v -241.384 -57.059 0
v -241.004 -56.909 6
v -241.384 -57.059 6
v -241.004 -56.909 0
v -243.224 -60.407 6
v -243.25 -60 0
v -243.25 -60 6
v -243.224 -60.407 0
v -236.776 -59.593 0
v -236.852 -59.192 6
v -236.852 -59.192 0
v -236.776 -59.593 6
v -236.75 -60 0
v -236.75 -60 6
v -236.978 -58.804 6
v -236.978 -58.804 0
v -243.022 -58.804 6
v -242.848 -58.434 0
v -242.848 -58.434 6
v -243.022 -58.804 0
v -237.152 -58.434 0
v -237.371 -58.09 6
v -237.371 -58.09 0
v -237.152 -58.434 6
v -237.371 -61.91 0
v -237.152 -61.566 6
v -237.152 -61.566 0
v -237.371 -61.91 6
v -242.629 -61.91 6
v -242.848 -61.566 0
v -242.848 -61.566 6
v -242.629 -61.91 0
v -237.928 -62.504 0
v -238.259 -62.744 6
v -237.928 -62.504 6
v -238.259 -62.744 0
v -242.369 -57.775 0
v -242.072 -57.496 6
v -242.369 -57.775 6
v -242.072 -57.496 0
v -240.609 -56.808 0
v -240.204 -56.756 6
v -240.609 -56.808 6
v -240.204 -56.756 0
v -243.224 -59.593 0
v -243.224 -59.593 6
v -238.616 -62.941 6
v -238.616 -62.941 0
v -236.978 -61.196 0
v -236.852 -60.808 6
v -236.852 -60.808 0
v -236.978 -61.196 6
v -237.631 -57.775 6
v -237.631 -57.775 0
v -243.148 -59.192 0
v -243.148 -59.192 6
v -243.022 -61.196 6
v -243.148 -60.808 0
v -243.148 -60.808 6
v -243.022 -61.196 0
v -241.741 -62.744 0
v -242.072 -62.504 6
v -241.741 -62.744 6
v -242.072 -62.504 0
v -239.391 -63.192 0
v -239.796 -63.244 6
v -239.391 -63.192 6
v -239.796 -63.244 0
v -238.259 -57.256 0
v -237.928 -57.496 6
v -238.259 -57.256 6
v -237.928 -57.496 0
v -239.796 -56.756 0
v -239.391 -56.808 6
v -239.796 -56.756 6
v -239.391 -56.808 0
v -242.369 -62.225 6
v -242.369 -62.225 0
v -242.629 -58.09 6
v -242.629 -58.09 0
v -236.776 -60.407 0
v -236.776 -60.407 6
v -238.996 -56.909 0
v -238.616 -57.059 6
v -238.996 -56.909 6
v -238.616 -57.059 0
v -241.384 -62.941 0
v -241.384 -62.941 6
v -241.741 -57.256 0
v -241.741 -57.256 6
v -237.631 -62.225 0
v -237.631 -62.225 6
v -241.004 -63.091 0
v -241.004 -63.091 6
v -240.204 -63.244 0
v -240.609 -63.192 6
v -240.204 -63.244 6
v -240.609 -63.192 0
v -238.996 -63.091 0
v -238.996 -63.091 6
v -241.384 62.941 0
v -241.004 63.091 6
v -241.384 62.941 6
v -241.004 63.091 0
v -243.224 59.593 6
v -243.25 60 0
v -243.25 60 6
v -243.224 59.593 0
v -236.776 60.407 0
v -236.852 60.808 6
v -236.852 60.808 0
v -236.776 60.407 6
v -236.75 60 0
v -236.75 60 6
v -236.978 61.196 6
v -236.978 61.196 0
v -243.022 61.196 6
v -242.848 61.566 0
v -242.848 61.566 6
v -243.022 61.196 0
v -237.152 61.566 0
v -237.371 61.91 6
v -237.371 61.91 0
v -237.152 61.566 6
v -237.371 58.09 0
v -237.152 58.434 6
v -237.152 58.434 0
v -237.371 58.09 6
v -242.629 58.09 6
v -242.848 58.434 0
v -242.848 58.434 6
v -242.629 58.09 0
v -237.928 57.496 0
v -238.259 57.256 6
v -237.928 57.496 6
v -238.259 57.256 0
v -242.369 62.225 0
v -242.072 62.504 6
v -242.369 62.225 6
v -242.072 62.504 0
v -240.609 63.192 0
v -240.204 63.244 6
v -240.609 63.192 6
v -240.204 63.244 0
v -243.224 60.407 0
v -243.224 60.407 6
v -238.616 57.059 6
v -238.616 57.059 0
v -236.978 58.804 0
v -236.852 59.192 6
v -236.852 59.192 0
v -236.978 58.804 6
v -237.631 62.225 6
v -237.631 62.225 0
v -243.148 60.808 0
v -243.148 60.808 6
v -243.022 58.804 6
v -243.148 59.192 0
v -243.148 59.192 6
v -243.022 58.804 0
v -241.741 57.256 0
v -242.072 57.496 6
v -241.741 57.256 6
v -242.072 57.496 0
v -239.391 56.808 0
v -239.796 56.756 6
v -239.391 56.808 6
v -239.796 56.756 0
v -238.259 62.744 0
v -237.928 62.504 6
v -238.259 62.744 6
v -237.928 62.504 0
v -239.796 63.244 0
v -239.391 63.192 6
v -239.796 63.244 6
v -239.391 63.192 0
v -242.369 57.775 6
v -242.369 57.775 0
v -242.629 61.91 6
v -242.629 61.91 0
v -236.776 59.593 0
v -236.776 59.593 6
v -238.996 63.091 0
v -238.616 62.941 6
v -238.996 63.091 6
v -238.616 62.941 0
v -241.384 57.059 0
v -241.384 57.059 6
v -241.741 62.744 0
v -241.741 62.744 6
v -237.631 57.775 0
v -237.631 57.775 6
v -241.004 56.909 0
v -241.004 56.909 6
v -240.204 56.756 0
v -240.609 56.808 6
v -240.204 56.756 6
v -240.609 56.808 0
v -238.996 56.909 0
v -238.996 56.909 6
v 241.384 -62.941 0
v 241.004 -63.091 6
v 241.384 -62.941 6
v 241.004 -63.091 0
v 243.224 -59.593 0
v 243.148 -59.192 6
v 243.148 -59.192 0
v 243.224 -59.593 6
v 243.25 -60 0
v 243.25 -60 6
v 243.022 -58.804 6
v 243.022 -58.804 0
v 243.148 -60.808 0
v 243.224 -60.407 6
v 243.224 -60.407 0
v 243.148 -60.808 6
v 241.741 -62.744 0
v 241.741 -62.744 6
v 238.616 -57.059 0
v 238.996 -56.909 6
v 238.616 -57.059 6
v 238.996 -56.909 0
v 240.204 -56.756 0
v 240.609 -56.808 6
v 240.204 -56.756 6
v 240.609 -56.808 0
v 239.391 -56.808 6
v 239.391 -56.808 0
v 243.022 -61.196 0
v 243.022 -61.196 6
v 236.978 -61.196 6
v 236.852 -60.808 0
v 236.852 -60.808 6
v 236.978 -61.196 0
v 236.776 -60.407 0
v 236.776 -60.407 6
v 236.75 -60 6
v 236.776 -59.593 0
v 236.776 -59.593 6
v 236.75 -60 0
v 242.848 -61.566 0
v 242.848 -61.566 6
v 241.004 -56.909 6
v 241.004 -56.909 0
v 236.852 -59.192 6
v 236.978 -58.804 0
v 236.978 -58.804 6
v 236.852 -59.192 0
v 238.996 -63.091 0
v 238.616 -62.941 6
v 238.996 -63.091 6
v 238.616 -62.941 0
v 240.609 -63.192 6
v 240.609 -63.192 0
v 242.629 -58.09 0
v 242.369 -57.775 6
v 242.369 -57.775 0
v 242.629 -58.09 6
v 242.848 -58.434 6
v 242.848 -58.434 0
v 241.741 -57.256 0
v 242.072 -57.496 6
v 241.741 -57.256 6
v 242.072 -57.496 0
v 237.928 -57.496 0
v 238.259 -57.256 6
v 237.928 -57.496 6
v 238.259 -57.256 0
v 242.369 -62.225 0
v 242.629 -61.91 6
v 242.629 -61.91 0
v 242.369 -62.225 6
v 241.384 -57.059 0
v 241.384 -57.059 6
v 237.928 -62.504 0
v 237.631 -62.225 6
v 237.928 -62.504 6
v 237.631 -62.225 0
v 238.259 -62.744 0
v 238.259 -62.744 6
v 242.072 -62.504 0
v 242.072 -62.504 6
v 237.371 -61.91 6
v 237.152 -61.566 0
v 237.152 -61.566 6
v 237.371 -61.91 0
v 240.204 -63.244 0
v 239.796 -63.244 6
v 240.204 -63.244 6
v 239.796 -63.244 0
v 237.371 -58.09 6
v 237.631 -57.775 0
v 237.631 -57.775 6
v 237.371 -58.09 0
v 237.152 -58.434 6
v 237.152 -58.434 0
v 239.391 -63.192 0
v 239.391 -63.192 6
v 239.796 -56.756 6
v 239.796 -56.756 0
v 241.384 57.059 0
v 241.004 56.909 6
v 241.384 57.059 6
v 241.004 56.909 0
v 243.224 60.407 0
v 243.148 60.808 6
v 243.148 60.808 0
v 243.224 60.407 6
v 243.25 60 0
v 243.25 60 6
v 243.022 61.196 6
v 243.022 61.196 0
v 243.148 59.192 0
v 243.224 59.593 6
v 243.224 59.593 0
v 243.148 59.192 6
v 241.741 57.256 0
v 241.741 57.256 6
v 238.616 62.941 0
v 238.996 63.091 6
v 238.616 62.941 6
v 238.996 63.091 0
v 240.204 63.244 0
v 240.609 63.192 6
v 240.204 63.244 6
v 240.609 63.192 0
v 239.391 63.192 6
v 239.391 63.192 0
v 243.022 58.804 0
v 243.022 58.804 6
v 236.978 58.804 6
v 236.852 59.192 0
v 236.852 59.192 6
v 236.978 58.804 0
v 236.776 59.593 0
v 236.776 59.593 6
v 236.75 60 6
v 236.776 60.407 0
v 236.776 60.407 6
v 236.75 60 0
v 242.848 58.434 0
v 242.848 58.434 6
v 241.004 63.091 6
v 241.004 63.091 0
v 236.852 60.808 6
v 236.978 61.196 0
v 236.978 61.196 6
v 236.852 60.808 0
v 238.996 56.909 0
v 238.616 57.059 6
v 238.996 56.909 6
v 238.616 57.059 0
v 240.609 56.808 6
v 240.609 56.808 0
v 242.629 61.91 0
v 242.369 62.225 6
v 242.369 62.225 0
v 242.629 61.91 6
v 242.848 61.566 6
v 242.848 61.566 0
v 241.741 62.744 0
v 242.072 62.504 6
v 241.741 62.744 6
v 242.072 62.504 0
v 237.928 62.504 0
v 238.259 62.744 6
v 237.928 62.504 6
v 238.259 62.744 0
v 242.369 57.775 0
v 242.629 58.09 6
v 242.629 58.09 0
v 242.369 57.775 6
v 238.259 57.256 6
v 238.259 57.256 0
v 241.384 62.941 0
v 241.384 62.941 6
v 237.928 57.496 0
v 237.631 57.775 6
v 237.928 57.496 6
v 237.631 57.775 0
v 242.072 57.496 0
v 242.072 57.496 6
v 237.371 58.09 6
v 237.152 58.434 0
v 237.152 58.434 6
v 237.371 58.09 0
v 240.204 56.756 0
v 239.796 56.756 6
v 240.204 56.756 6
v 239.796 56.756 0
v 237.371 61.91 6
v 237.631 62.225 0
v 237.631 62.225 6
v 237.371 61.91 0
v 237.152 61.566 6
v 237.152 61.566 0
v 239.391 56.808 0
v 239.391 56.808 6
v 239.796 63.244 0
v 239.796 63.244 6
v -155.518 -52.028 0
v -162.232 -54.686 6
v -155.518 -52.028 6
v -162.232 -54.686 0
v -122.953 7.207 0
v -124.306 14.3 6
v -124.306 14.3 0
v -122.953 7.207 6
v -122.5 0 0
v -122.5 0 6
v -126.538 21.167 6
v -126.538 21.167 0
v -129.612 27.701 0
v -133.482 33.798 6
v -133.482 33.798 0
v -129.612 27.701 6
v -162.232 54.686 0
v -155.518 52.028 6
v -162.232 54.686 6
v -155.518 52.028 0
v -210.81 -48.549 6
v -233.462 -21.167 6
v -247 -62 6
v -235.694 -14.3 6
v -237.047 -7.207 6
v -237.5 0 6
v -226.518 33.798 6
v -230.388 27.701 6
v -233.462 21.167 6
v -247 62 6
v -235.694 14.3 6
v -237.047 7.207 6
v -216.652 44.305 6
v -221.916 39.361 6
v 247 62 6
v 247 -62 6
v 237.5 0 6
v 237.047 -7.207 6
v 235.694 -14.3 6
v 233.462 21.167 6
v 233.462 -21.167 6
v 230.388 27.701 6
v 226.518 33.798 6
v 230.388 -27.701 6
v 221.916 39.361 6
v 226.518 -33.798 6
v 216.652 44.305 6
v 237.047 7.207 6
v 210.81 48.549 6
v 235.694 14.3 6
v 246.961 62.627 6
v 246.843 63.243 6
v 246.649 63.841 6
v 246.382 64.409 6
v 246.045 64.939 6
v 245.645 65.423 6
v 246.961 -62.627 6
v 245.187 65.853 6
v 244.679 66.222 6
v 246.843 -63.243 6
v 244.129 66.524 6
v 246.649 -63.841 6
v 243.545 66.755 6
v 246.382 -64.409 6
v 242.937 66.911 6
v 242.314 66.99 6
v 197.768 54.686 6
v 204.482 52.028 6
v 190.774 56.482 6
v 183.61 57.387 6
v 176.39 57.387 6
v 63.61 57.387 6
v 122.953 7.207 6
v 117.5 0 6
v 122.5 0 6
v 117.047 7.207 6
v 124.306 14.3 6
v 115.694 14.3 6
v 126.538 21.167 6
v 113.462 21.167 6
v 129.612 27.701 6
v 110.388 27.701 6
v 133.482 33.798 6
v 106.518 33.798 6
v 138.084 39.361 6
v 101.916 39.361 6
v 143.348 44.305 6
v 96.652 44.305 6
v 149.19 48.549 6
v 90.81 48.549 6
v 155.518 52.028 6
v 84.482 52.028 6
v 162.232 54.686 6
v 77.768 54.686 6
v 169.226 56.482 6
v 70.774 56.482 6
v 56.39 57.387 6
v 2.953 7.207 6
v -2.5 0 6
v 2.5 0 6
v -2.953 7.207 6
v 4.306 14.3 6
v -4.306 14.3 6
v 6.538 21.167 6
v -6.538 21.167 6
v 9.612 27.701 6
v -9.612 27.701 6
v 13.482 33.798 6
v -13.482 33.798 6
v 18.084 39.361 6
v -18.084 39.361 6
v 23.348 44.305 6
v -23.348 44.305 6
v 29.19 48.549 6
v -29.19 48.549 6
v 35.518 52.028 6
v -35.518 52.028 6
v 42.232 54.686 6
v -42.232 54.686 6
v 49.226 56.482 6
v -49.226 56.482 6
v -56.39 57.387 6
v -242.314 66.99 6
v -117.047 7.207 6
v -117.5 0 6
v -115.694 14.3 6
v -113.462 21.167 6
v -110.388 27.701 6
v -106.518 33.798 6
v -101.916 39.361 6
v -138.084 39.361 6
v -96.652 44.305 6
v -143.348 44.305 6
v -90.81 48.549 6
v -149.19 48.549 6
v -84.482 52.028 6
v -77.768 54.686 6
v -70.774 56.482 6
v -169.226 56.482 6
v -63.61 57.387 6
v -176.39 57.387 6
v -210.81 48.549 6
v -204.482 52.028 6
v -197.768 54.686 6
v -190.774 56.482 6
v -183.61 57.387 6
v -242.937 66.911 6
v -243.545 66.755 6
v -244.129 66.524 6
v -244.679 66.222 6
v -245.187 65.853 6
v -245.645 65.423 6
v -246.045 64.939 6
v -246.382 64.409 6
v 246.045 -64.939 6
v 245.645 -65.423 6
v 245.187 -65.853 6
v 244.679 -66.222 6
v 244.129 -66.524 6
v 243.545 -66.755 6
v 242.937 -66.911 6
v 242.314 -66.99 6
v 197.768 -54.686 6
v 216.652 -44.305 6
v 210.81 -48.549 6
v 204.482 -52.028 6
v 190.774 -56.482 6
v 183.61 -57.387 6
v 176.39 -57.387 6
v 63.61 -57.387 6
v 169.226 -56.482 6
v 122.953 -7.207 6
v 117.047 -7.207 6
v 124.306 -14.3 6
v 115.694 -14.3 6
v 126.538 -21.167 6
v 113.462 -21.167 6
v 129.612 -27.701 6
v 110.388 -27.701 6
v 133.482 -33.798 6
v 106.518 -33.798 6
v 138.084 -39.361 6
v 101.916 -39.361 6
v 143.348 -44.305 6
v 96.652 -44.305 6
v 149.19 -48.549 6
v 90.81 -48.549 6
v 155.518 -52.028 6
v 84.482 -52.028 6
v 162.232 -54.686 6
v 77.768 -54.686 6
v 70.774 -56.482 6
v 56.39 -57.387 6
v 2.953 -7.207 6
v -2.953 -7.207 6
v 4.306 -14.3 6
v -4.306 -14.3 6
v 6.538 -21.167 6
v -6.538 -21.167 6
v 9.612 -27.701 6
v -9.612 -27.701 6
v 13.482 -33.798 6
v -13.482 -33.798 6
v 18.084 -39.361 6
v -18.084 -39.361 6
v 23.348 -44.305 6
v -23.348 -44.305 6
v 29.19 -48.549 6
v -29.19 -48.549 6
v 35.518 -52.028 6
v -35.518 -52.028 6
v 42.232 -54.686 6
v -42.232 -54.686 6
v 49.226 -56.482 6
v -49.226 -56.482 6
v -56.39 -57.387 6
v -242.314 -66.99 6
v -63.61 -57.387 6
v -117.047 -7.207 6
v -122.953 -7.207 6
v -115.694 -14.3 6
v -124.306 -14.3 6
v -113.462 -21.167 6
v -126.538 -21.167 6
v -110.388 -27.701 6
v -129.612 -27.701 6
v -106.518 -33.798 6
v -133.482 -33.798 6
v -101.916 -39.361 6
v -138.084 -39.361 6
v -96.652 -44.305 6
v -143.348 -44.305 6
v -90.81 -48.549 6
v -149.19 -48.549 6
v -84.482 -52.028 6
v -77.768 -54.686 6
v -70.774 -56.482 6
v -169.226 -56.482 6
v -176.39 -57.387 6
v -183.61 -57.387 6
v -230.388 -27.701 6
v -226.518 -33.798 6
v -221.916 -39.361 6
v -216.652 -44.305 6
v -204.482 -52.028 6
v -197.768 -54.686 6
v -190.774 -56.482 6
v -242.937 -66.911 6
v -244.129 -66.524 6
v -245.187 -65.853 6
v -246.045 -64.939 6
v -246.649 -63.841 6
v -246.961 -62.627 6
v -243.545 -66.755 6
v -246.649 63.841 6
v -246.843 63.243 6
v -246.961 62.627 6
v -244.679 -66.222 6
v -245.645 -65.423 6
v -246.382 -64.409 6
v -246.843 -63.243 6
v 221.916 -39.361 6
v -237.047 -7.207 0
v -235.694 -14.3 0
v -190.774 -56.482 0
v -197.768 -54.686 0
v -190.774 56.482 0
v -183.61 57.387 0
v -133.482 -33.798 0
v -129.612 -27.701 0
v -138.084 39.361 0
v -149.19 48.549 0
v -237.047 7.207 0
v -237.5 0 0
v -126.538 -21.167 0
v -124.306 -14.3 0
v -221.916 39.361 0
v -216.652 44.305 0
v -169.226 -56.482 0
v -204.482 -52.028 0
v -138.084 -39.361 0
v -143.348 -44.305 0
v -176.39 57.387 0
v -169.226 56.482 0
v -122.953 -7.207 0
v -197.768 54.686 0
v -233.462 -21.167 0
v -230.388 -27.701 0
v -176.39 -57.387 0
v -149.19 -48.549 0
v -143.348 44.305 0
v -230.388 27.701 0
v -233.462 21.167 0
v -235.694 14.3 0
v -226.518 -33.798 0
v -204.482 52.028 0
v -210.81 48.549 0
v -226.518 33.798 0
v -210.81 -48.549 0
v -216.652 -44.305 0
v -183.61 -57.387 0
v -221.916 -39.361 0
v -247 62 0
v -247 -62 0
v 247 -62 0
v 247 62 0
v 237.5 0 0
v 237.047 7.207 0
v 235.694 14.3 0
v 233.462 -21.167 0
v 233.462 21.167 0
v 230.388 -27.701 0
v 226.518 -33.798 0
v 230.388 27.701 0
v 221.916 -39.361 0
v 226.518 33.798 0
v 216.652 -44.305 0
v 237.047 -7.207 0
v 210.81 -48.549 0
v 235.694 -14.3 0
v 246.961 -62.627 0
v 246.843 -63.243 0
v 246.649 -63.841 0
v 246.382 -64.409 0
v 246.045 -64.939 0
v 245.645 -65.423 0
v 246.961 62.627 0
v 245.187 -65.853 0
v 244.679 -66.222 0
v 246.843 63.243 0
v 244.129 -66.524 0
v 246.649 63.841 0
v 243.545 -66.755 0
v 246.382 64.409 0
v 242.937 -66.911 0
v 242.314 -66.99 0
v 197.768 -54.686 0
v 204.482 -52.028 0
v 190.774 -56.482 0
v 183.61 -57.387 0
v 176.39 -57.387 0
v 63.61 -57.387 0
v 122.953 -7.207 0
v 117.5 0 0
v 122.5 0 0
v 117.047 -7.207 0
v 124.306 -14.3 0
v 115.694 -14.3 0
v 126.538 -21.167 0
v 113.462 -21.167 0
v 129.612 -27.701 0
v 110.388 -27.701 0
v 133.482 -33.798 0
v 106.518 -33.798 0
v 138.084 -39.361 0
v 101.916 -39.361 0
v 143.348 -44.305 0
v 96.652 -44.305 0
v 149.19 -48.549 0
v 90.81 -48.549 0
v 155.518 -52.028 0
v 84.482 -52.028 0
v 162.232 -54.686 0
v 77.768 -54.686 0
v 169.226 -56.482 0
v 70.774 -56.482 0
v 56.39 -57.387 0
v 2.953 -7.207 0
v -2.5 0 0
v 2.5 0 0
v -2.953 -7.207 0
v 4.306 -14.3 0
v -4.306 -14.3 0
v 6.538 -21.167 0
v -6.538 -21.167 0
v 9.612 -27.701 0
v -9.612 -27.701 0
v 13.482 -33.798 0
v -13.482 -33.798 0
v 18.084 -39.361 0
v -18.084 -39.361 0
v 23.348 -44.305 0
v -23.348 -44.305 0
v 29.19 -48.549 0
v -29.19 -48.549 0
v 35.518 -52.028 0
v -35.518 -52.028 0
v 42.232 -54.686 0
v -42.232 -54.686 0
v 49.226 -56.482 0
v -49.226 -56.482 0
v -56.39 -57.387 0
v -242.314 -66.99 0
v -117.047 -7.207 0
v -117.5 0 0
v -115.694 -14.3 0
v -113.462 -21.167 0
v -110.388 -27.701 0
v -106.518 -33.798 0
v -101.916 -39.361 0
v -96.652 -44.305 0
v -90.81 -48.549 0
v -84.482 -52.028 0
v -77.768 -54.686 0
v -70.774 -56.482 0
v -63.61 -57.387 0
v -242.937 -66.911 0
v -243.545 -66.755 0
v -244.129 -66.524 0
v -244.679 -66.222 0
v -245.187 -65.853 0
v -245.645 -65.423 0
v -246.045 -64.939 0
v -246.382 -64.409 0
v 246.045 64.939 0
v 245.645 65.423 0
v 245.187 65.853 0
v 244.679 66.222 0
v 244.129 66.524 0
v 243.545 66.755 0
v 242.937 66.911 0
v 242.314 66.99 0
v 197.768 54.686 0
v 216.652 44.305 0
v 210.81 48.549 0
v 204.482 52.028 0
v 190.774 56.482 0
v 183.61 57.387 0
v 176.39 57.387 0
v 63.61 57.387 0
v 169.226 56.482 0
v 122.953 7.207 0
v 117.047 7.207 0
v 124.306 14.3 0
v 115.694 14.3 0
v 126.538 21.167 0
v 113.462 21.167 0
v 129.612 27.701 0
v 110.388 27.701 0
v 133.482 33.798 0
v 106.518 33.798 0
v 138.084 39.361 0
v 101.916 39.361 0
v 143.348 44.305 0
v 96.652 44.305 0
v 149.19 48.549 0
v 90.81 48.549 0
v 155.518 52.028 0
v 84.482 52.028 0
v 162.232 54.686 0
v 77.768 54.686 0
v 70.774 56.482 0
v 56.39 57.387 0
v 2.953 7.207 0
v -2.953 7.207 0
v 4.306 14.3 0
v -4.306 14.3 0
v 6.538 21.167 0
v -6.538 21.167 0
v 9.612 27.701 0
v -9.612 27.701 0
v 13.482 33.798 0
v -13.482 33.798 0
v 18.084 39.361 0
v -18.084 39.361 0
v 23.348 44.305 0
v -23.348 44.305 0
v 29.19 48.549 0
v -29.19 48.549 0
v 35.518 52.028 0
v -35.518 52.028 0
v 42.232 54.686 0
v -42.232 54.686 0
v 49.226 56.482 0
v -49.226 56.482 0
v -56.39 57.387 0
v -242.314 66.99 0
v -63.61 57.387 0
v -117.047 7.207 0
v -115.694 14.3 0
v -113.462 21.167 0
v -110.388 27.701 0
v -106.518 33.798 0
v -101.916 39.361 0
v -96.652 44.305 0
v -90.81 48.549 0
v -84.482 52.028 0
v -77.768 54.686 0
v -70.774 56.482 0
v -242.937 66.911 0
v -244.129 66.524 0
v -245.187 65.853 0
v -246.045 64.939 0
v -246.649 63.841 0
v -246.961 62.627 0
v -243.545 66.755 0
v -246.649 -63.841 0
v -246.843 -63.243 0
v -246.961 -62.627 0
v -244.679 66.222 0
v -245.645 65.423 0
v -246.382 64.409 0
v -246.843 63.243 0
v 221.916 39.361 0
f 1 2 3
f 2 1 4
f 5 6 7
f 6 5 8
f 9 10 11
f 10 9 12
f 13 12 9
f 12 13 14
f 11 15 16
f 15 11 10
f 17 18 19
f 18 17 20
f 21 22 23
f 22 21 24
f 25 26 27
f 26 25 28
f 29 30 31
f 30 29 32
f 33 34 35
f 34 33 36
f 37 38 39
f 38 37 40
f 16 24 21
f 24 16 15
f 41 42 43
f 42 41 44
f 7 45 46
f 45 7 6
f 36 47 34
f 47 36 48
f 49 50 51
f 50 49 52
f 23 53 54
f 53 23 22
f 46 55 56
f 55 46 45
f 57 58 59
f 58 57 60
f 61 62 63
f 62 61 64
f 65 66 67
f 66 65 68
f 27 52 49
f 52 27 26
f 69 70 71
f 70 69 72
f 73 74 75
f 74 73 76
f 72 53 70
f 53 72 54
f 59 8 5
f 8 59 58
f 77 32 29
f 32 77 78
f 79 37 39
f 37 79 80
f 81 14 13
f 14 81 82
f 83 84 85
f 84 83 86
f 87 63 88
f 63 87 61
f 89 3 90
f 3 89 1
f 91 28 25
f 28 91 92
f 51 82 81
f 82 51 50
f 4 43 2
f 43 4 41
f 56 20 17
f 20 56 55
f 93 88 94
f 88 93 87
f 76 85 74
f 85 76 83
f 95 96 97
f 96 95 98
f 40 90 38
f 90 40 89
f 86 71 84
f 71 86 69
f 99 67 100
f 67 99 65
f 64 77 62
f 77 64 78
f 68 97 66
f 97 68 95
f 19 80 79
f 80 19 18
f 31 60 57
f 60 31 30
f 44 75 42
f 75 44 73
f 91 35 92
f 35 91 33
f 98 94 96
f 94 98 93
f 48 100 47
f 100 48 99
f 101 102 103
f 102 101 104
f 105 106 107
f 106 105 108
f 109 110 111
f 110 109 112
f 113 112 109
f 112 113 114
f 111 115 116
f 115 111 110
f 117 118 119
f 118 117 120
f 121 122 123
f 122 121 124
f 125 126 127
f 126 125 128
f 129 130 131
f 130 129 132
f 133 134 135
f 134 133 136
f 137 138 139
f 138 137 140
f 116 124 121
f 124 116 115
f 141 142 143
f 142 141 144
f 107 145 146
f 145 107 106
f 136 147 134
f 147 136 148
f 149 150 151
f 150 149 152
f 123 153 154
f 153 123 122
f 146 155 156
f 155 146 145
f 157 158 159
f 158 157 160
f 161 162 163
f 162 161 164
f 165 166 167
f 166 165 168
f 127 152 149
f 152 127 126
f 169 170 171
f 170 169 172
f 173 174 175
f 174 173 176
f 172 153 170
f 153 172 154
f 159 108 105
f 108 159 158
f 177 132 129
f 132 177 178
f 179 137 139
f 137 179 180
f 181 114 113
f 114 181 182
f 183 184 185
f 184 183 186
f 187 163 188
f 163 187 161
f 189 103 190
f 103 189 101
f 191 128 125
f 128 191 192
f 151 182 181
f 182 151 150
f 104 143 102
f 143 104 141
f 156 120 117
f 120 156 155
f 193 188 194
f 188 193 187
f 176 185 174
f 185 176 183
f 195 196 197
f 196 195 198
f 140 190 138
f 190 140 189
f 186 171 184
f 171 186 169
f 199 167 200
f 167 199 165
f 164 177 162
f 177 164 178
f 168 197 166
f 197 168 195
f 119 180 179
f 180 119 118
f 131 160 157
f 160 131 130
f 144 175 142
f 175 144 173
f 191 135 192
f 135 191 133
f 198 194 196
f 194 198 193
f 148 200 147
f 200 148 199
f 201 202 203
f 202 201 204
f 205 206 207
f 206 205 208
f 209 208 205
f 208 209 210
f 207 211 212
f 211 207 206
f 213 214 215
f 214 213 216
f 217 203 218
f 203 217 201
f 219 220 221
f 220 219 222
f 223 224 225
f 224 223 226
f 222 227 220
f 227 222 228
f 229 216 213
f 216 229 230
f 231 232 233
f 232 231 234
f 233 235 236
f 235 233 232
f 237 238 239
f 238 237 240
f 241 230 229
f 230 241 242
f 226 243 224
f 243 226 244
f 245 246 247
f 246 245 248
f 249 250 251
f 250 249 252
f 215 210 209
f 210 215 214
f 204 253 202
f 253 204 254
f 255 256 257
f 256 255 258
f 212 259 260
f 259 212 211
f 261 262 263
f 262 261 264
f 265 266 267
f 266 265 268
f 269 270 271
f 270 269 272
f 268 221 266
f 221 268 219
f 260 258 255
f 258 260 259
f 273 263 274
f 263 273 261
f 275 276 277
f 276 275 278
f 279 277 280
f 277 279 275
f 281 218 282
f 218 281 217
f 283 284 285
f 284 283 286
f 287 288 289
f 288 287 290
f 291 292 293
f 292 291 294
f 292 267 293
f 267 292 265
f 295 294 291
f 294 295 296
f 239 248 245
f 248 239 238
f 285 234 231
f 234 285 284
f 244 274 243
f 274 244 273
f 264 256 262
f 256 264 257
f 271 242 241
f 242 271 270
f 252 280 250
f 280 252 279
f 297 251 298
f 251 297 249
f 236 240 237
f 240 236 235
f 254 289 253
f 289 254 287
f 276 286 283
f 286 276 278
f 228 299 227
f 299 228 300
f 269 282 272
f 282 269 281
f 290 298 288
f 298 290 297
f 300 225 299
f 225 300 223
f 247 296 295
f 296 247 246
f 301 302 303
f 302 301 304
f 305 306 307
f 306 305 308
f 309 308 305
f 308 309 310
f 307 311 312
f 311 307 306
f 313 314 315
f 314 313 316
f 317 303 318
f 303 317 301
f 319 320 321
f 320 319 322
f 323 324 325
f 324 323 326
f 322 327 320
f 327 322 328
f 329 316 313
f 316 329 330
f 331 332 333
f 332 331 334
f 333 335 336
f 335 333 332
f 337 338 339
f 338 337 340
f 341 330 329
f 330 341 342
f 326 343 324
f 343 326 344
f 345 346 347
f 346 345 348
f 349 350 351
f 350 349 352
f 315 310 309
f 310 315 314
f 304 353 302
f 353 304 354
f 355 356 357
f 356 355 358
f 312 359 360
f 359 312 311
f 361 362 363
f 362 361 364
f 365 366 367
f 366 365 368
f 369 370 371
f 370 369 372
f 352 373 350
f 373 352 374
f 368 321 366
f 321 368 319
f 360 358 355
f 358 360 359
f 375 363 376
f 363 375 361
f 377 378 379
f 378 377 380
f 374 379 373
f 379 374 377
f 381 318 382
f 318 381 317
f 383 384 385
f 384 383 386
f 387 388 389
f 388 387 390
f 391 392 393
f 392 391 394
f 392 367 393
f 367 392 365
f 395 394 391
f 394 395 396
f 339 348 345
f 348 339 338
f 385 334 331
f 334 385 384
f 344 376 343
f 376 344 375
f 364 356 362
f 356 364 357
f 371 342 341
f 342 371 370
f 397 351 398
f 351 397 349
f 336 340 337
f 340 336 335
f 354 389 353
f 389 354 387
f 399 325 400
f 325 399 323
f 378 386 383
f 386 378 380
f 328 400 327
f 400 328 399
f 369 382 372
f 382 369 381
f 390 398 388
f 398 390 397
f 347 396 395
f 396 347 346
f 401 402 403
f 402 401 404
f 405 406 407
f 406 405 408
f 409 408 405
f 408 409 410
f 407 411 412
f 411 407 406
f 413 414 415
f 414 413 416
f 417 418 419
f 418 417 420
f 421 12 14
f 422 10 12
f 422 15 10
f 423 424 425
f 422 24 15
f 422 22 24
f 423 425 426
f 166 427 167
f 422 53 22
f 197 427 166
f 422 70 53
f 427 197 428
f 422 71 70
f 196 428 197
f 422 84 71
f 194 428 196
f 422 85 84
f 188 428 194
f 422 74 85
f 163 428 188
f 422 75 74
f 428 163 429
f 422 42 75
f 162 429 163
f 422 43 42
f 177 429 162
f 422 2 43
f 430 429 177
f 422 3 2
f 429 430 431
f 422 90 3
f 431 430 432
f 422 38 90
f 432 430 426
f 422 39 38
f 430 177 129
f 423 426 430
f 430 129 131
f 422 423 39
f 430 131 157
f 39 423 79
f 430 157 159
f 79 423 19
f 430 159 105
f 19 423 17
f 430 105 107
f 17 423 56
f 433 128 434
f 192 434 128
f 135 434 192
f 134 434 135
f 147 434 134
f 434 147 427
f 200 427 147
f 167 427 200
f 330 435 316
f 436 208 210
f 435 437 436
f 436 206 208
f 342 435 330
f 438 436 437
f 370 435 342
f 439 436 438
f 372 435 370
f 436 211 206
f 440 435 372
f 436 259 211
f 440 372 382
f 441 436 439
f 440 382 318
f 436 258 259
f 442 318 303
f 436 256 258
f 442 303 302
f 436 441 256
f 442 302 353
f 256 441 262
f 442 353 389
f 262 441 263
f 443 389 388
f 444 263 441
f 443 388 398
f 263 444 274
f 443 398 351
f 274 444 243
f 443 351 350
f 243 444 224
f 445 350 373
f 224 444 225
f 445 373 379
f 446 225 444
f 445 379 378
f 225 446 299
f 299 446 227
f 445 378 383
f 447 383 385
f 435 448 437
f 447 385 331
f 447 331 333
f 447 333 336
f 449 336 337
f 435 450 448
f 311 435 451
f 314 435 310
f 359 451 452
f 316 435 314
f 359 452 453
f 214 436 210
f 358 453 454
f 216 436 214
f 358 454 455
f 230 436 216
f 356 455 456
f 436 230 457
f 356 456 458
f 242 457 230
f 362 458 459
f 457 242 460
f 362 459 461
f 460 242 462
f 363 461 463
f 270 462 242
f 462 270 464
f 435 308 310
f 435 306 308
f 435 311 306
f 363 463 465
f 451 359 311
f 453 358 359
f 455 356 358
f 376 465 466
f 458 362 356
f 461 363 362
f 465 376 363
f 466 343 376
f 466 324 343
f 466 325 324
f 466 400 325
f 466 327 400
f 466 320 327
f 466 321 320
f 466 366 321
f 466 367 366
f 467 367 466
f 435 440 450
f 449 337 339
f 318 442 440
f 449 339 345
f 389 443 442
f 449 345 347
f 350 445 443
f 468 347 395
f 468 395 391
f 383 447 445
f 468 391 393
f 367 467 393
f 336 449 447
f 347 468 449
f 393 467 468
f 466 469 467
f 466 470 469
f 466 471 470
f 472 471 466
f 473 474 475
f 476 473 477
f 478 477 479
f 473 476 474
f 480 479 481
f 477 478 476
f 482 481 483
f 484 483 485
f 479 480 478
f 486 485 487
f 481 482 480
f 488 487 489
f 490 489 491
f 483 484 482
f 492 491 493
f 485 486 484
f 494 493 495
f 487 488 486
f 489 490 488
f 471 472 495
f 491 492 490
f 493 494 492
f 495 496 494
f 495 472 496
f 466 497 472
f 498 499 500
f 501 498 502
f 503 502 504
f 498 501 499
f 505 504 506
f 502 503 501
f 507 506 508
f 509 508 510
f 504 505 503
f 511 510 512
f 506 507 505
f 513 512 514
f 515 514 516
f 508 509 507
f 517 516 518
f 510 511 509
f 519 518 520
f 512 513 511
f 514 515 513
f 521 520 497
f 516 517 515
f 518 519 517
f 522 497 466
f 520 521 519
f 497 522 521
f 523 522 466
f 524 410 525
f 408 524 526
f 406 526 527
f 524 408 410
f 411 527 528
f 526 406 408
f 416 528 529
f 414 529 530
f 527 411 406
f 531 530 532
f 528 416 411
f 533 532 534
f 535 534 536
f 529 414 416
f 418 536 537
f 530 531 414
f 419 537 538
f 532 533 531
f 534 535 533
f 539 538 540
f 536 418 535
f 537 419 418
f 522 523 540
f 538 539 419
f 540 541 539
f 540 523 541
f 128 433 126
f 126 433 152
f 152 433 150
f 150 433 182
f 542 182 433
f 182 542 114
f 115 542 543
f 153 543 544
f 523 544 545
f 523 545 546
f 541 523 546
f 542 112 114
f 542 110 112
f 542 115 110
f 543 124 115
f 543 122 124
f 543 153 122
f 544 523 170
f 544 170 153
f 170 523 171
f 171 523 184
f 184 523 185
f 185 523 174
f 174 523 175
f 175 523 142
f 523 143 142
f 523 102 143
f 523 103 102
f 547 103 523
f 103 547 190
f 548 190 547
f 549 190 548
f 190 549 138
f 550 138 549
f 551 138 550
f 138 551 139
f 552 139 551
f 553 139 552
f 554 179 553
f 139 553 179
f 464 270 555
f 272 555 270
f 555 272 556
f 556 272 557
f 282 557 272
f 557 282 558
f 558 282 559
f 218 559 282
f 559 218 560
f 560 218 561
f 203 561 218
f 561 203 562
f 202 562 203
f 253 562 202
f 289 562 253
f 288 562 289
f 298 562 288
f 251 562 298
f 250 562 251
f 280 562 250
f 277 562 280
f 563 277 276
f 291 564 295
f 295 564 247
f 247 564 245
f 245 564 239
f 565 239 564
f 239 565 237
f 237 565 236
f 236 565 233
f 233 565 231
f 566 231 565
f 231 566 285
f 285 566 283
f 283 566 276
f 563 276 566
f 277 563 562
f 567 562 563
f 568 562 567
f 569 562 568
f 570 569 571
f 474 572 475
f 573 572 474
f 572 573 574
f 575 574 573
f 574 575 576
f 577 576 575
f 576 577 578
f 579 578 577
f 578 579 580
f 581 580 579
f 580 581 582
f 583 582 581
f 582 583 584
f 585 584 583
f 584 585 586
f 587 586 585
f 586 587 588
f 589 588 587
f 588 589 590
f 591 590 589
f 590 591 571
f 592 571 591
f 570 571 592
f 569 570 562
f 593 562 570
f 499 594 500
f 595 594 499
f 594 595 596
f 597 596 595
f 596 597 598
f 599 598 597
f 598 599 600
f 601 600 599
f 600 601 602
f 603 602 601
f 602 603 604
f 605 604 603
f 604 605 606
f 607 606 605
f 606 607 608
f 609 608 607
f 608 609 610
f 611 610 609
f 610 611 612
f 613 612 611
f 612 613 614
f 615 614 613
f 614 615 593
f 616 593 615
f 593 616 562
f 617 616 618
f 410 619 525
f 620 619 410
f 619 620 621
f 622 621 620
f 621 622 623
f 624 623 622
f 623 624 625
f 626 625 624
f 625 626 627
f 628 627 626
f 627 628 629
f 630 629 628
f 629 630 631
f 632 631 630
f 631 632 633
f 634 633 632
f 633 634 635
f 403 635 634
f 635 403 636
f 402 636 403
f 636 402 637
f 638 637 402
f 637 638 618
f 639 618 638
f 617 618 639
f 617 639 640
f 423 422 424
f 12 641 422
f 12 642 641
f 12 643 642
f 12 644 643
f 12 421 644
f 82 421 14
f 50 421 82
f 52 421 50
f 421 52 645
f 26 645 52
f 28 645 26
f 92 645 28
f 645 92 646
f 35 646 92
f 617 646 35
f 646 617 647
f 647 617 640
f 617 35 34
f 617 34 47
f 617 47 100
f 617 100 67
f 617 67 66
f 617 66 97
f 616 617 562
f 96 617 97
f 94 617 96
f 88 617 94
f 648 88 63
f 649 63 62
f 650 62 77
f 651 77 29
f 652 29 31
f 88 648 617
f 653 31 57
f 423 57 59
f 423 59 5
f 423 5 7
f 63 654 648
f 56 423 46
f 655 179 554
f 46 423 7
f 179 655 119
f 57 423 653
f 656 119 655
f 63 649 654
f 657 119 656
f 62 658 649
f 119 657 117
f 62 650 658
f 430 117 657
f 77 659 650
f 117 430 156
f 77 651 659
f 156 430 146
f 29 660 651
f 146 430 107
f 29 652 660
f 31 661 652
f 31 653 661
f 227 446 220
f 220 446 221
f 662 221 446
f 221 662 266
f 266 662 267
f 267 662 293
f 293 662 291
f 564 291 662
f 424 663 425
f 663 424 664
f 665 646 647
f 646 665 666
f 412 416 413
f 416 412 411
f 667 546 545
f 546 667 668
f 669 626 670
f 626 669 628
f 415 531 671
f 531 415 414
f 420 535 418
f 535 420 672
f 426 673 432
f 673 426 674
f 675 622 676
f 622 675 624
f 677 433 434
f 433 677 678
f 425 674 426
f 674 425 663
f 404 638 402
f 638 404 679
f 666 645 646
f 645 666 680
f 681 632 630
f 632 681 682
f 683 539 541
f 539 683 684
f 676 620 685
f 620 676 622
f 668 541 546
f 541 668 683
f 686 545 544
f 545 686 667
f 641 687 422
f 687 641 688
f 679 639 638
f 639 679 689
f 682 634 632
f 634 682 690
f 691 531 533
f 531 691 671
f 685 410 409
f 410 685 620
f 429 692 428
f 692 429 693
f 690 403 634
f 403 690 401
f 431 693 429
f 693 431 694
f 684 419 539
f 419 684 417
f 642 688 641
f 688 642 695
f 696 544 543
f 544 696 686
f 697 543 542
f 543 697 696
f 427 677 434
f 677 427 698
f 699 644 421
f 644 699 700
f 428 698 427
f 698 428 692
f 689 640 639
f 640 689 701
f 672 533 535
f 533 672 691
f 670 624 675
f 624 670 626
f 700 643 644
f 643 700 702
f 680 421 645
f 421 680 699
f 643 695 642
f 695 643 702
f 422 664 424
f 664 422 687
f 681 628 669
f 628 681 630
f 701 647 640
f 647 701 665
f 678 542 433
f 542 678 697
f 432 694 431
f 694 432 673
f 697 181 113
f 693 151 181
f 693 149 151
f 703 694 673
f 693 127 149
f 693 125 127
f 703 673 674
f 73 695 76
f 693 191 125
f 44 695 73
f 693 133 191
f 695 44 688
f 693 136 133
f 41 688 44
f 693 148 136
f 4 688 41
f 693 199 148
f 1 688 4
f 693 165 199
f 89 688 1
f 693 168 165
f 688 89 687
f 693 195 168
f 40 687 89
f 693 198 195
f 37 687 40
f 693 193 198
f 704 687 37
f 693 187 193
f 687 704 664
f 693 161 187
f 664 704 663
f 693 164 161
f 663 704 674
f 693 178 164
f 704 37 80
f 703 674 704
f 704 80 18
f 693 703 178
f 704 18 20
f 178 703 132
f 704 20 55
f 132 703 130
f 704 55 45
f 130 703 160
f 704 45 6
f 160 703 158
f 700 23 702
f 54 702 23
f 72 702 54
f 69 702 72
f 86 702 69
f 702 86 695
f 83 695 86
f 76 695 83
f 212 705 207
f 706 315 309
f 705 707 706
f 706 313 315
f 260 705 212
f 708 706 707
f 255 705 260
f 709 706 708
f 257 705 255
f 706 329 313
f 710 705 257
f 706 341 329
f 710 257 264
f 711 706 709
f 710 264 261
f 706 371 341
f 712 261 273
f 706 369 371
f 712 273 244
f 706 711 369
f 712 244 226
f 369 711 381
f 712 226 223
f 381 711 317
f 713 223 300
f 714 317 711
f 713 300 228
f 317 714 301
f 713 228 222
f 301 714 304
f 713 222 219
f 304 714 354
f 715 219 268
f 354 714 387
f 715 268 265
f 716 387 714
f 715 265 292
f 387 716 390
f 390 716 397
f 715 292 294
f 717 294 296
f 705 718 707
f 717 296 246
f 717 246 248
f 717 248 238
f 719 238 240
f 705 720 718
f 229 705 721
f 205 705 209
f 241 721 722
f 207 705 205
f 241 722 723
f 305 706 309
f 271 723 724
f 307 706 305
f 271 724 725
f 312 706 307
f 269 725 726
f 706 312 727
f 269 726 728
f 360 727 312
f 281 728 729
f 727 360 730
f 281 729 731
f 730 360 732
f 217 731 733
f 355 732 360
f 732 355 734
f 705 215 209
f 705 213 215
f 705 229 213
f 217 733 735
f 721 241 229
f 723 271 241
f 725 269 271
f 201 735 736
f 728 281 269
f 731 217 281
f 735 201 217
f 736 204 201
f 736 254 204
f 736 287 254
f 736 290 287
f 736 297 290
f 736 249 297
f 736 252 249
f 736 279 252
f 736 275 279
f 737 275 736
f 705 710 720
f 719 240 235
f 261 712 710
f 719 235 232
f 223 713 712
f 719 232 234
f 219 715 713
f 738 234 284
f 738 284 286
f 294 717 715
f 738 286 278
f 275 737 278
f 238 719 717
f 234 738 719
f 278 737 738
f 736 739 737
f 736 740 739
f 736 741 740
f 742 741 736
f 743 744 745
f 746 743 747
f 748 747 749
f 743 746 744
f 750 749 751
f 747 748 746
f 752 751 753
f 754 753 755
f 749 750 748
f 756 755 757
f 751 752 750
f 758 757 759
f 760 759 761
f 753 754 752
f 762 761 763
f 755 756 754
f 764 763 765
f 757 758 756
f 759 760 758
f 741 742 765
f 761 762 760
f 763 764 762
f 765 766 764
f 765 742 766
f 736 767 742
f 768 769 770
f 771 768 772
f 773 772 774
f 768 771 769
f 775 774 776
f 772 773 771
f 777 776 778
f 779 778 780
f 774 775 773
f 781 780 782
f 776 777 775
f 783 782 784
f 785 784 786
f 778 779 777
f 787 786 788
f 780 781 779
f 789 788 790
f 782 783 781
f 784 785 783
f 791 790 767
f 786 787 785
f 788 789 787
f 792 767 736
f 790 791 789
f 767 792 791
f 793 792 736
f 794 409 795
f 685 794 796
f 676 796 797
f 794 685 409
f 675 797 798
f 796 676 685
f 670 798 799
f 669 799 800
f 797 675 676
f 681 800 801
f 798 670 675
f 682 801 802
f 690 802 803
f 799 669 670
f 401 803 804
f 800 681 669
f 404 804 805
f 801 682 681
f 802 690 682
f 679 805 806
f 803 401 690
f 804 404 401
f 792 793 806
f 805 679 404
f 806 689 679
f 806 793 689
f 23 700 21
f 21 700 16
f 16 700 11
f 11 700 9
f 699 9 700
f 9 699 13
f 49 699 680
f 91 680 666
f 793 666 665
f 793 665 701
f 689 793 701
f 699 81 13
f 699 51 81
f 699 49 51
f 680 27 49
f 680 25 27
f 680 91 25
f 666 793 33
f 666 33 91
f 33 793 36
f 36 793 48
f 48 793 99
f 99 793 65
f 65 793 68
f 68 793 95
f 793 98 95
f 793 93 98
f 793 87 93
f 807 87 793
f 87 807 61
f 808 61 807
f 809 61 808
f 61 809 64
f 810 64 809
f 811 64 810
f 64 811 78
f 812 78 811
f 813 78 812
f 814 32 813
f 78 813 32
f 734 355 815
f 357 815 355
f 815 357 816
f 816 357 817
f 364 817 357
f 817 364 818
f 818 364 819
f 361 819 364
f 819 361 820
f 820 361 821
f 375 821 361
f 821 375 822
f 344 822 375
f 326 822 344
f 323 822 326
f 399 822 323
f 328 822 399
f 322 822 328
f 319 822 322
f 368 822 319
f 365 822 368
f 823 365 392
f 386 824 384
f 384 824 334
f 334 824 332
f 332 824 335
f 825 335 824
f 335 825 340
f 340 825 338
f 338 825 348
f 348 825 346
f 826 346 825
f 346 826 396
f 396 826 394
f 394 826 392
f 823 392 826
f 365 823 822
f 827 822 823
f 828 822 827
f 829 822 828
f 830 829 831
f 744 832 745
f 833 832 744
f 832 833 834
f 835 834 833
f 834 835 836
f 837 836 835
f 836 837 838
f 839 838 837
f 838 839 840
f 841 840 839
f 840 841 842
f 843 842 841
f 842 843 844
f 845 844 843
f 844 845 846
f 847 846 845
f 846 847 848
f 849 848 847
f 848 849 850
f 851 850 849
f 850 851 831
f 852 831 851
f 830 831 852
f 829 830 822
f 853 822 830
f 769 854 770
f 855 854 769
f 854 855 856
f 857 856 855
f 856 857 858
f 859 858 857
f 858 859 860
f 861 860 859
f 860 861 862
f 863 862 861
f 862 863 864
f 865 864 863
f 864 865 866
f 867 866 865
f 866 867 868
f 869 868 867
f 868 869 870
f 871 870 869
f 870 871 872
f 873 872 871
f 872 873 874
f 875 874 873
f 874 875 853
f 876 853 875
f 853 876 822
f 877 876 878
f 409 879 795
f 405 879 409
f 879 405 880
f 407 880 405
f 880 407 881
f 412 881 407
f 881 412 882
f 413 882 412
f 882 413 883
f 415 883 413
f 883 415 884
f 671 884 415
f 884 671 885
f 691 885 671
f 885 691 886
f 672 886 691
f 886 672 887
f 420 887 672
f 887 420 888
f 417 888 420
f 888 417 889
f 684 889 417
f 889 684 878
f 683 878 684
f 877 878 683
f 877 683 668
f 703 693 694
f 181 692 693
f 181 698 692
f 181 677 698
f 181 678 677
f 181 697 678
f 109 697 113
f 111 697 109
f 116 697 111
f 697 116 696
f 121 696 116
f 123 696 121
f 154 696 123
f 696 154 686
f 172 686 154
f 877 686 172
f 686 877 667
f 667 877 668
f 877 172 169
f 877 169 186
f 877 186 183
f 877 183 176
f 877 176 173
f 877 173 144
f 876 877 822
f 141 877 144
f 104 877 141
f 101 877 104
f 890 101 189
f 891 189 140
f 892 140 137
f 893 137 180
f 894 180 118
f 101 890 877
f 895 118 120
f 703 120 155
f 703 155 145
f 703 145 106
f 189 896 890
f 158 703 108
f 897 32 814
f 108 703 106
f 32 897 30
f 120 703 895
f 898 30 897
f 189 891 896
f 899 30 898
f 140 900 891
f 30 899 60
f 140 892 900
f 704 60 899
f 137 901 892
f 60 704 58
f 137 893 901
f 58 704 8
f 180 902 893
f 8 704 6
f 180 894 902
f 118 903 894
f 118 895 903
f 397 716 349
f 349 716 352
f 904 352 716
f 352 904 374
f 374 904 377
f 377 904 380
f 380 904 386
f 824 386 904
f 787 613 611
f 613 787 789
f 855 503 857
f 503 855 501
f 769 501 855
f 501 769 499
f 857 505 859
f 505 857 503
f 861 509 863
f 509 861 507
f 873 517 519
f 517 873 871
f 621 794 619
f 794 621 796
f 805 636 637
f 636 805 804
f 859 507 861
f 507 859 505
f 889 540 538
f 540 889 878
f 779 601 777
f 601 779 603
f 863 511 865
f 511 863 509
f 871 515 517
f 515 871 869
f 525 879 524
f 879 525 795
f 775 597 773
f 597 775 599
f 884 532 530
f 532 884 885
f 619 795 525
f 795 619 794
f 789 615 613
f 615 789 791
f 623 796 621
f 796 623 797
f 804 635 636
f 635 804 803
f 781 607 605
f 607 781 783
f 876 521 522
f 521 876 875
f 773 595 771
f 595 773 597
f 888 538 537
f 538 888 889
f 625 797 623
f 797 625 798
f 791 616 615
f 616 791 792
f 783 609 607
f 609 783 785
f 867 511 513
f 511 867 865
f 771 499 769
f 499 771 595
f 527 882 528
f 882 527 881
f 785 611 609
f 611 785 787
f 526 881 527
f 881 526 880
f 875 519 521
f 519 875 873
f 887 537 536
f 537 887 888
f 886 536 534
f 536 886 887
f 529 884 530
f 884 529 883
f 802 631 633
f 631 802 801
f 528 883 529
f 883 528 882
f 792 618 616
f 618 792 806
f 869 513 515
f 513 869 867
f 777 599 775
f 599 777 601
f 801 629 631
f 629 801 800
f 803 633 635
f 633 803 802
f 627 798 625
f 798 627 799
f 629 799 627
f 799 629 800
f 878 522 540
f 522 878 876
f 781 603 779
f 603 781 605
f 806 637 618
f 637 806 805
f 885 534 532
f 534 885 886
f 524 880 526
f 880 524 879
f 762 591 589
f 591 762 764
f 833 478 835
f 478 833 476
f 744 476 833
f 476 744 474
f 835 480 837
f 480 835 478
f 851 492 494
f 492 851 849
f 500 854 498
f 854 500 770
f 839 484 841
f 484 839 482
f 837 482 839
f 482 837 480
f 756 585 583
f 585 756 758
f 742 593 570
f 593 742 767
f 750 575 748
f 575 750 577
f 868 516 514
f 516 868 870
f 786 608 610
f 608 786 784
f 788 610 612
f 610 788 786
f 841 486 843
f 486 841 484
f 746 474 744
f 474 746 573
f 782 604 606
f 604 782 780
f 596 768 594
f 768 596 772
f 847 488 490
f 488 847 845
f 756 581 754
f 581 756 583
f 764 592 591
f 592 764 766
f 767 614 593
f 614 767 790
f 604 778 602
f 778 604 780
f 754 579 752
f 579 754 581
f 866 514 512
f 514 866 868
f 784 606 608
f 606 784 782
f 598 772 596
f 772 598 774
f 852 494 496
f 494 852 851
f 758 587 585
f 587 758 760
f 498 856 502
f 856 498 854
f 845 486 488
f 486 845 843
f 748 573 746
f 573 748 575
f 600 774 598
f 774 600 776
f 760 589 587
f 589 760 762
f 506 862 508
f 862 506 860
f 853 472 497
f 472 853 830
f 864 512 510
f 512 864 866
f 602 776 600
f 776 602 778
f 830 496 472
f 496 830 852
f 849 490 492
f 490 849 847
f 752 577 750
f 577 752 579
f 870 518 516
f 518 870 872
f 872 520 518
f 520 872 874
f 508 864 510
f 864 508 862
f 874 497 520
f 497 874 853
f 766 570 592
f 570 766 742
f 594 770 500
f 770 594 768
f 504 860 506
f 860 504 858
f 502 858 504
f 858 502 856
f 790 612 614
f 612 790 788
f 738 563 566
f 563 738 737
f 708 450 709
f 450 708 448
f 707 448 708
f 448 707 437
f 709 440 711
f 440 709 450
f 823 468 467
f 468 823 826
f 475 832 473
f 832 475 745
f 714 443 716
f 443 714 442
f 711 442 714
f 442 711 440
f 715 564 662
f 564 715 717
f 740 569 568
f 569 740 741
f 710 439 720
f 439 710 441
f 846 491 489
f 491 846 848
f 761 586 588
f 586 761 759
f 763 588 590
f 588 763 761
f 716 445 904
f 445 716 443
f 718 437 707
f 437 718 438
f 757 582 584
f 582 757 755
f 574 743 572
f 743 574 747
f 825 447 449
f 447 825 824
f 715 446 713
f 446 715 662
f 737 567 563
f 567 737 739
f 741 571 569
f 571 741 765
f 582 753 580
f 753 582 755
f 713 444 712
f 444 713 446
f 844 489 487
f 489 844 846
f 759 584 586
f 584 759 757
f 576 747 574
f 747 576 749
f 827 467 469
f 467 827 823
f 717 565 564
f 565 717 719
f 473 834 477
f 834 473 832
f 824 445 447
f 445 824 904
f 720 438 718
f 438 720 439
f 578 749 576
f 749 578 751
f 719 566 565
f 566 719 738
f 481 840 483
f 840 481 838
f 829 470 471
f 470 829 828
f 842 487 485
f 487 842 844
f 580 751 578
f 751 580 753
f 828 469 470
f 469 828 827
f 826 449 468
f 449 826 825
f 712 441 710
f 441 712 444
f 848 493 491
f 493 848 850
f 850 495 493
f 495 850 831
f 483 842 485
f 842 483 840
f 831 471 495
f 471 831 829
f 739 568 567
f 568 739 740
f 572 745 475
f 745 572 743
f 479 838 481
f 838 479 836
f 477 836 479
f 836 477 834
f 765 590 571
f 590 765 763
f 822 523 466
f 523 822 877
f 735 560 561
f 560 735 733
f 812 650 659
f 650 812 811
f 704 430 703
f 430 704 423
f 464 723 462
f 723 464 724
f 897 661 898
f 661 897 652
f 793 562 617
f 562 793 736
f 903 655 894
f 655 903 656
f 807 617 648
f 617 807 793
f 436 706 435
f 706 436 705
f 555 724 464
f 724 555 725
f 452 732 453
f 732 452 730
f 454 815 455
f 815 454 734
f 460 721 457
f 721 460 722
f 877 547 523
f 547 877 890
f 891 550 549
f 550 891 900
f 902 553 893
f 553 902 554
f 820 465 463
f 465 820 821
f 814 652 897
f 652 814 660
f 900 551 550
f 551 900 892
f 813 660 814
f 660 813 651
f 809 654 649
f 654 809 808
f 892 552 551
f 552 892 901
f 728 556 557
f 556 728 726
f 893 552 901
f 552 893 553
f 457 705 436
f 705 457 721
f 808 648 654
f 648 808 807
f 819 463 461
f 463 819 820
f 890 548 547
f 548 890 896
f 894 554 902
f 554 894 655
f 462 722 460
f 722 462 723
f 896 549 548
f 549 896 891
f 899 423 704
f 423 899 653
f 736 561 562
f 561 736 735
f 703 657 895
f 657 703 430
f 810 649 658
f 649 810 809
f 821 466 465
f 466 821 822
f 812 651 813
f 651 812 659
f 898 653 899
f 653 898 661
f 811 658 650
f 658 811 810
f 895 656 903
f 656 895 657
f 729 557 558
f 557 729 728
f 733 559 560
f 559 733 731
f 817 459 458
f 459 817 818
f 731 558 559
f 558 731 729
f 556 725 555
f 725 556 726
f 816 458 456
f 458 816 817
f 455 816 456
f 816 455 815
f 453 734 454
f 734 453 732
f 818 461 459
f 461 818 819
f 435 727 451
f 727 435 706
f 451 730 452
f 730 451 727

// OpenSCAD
$fn = 50;


difference() {
	union() {
		hull() {
			translate(v = [-242.0000000000, 62.0000000000, 0]) {
				cylinder(h = 6, r = 5);
			}
			translate(v = [242.0000000000, 62.0000000000, 0]) {
				cylinder(h = 6, r = 5);
			}
			translate(v = [-242.0000000000, -62.0000000000, 0]) {
				cylinder(h = 6, r = 5);
			}
			translate(v = [242.0000000000, -62.0000000000, 0]) {
				cylinder(h = 6, r = 5);
			}
		}
	}
	union() {
		#translate(v = [-240.0000000000, -60.0000000000, -100.0000000000]) {
			cylinder(h = 200, r = 3.2500000000);
		}
		#translate(v = [-240.0000000000, 60.0000000000, -100.0000000000]) {
			cylinder(h = 200, r = 3.2500000000);
		}
		#translate(v = [240.0000000000, -60.0000000000, -100.0000000000]) {
			cylinder(h = 200, r = 3.2500000000);
		}
		#translate(v = [240.0000000000, 60.0000000000, -100.0000000000]) {
			cylinder(h = 200, r = 3.2500000000);
		}
		#translate(v = [-180.0000000000, 0, 0]) {
			cylinder(h = 6, r = 57.5000000000);
		}
		#translate(v = [-60.0000000000, 0, 0]) {
			cylinder(h = 6, r = 57.5000000000);
		}
		#translate(v = [60.0000000000, 0, 0]) {
			cylinder(h = 6, r = 57.5000000000);
		}
		#translate(v = [180.0000000000, 0, 0]) {
			cylinder(h = 6, r = 57.5000000000);
		}
	}
}
